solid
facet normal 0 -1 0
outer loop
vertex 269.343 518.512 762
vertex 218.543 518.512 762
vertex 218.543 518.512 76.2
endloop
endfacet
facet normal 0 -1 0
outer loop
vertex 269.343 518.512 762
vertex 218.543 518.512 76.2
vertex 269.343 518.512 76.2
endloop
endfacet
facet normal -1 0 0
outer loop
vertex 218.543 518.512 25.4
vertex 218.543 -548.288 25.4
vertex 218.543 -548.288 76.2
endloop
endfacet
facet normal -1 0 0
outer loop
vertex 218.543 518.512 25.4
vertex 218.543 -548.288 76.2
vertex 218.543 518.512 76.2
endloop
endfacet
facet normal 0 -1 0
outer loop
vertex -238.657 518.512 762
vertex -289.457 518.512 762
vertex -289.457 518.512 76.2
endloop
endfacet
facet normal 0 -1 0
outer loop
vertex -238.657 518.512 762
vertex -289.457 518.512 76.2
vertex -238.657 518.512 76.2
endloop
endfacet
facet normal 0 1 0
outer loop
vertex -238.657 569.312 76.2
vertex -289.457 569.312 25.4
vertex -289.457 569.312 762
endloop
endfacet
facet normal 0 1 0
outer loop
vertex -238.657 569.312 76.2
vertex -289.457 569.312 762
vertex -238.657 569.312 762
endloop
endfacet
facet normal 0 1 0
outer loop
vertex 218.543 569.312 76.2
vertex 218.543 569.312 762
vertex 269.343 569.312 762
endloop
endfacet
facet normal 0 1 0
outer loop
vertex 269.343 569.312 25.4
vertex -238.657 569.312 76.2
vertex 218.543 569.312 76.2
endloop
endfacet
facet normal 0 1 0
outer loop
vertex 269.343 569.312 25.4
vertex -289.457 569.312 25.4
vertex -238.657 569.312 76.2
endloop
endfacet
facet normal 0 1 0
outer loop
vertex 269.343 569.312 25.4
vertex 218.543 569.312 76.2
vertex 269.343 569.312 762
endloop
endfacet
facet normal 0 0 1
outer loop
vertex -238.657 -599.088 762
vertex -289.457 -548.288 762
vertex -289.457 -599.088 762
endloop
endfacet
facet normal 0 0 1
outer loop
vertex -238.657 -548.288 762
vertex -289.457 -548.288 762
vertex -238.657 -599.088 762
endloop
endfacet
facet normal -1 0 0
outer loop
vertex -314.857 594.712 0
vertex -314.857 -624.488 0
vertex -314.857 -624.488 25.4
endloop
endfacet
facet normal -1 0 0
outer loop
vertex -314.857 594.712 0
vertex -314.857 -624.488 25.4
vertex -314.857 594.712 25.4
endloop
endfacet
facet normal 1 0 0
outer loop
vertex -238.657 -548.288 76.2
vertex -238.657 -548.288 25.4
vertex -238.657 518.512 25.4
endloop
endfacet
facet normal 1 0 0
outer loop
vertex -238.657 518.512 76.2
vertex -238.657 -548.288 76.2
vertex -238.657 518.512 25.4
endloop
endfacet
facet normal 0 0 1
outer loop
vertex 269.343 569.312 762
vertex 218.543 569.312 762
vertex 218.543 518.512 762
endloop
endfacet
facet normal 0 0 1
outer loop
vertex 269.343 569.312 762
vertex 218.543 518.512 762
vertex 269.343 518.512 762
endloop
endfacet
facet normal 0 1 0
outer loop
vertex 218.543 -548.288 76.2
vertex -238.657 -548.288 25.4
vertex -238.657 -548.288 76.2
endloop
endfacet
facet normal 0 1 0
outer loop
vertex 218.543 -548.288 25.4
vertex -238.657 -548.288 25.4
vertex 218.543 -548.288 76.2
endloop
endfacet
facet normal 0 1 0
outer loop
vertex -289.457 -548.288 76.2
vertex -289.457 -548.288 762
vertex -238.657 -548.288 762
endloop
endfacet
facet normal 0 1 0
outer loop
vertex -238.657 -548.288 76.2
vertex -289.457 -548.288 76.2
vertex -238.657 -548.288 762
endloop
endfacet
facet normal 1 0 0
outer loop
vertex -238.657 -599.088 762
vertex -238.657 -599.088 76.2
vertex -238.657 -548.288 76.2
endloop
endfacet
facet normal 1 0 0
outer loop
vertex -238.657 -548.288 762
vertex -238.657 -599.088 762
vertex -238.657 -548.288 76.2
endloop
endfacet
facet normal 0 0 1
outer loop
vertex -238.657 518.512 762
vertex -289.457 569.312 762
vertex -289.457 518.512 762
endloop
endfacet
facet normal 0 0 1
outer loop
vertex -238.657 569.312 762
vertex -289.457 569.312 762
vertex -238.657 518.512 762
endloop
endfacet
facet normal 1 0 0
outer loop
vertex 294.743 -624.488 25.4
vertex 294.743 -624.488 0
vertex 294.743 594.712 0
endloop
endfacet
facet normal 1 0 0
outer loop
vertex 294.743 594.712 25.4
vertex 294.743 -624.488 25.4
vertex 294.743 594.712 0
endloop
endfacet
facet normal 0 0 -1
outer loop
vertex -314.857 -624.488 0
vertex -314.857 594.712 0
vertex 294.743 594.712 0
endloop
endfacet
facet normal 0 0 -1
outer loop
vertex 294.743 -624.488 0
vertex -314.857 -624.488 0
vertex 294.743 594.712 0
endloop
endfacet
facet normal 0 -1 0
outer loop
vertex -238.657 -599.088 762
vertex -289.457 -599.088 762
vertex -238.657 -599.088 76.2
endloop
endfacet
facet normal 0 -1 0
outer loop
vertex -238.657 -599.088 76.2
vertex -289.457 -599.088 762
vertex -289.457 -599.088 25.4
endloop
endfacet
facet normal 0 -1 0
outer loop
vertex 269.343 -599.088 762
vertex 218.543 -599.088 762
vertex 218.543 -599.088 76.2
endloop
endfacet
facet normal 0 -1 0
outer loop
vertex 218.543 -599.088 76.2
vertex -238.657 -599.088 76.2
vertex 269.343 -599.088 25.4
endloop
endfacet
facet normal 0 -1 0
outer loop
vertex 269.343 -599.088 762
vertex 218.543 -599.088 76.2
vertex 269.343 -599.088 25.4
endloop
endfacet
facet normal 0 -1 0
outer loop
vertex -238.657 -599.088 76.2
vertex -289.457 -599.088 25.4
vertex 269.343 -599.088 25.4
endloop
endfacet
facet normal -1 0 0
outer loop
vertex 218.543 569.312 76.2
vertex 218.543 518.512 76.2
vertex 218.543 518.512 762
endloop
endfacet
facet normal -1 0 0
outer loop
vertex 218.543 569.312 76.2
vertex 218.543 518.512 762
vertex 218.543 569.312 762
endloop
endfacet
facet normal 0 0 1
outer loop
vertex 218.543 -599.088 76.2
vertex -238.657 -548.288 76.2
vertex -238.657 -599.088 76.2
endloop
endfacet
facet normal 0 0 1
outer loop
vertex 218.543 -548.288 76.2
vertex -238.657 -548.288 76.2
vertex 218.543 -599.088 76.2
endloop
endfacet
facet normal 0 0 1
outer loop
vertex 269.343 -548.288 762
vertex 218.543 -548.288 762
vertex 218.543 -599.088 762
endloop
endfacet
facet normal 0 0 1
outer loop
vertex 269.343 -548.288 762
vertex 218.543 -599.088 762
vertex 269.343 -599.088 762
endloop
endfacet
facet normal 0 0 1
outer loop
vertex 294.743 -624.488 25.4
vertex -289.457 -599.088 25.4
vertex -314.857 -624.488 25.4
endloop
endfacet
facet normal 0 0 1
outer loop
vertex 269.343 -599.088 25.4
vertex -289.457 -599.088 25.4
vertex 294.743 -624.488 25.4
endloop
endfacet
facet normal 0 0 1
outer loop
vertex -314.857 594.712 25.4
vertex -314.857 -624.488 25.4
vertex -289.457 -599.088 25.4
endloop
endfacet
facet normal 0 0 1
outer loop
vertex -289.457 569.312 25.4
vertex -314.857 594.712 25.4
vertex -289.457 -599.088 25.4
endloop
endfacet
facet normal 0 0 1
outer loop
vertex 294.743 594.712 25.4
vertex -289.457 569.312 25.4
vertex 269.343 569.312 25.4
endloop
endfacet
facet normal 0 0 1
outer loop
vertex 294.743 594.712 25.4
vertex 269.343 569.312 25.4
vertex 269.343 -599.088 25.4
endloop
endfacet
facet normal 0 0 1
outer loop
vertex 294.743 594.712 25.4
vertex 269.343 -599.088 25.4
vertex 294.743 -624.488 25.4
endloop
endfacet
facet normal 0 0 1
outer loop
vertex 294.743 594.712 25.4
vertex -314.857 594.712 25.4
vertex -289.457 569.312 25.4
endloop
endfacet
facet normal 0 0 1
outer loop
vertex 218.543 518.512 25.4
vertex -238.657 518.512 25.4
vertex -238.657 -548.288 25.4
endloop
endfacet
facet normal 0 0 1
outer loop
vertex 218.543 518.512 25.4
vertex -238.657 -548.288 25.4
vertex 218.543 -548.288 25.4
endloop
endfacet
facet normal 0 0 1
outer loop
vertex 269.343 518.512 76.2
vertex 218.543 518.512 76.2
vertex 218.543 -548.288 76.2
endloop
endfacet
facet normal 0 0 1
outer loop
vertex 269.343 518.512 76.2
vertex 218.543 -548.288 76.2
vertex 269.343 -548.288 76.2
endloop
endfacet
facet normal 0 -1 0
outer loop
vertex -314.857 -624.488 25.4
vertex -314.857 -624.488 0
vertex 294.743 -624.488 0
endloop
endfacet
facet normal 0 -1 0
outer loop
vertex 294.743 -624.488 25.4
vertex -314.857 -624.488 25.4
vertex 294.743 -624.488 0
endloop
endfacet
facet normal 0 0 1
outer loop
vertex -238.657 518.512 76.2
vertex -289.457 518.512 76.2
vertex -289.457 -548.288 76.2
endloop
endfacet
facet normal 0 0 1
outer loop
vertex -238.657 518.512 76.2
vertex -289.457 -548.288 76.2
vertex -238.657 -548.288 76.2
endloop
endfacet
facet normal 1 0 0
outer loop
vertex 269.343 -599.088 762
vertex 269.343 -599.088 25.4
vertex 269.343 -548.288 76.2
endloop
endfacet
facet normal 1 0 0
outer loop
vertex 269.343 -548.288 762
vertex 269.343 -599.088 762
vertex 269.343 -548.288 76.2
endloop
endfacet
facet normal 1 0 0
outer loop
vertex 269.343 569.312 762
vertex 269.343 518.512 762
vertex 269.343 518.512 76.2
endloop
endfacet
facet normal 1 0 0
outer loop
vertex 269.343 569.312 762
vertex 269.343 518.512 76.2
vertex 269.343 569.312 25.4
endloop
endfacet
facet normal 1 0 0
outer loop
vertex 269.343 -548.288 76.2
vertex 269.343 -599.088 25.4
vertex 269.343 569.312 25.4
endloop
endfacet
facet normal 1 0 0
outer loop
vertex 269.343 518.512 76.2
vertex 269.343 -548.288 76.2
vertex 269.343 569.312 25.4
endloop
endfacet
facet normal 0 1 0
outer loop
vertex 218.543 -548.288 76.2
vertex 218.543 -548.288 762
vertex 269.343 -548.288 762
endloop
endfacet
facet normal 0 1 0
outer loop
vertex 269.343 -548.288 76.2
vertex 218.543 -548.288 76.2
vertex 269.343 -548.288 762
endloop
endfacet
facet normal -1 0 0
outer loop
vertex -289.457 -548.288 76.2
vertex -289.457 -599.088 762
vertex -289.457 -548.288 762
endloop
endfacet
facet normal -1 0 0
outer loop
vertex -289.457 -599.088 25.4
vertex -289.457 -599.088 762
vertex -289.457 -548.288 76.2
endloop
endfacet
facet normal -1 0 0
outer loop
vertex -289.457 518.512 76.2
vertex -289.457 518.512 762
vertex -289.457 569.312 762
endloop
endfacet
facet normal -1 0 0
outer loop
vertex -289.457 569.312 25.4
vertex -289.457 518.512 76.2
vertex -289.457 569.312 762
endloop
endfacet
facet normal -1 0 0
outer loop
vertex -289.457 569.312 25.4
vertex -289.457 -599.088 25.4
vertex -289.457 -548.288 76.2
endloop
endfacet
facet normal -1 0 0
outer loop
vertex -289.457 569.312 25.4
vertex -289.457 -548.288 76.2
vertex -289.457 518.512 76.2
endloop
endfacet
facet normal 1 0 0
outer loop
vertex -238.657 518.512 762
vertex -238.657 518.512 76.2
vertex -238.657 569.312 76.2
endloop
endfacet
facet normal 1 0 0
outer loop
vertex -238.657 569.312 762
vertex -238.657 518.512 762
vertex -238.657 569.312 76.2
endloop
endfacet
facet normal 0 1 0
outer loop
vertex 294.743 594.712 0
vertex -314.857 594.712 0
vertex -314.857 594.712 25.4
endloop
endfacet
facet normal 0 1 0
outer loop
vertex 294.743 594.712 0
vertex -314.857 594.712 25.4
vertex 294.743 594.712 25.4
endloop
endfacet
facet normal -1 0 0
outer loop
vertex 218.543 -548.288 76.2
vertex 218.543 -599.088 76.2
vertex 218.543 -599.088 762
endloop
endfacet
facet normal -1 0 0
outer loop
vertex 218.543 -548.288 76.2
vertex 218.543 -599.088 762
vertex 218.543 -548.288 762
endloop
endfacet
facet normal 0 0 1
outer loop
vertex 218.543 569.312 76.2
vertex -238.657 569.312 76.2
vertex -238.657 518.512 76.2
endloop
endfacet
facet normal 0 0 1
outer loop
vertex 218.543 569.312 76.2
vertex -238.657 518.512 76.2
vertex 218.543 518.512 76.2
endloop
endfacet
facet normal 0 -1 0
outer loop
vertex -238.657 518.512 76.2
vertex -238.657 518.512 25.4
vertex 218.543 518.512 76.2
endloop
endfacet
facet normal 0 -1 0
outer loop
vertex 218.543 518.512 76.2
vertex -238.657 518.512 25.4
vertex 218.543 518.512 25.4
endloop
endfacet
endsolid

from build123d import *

# Parameters (mm, degrees)
F0_W     = 609.6
F0_H     = 1219.2
F1_DEPTH = 25.4
F2_W     = 558.8
F2_H     = 1168.4
F2_W_2   = 457.2
F2_H_2   = 1066.8
F3_DEPTH = 50.8
F4_W     = 50.8
F4_H     = 50.8
F5_DEPTH = 685.8


with BuildPart() as f1:
    # F0 (on Top) → F1 (new body)
    with BuildSketch(Plane.XY):
        with Locations((-10.056729, -14.887511)):
            Rectangle(F0_W, F0_H)
    extrude(amount=F1_DEPTH)

    # F2 (on face) → F3 (join)
    with BuildSketch(Plane.XY.offset(25.4)):
        with Locations((-10.056729, -14.887511)):
            Rectangle(F2_W, F2_H)
        with Locations((-10.056729, -14.887511)):
            Rectangle(F2_W_2, F2_H_2, mode=Mode.SUBTRACT)
    extrude(amount=F3_DEPTH)

    # F4 (on face) → F5 (join)
    with BuildSketch(Plane.XY.offset(76.2)):
        with Locations((-264.056729, 543.912489)):
            Rectangle(F4_W, F4_H)
        with Locations((243.943271, 543.912489)):
            Rectangle(F4_W, F4_H)
        with Locations((-264.056729, -573.687511)):
            Rectangle(F4_W, F4_H)
        with Locations((243.943271, -573.687511)):
            Rectangle(F4_W, F4_H)
    extrude(amount=F5_DEPTH)


solid = f1.part
